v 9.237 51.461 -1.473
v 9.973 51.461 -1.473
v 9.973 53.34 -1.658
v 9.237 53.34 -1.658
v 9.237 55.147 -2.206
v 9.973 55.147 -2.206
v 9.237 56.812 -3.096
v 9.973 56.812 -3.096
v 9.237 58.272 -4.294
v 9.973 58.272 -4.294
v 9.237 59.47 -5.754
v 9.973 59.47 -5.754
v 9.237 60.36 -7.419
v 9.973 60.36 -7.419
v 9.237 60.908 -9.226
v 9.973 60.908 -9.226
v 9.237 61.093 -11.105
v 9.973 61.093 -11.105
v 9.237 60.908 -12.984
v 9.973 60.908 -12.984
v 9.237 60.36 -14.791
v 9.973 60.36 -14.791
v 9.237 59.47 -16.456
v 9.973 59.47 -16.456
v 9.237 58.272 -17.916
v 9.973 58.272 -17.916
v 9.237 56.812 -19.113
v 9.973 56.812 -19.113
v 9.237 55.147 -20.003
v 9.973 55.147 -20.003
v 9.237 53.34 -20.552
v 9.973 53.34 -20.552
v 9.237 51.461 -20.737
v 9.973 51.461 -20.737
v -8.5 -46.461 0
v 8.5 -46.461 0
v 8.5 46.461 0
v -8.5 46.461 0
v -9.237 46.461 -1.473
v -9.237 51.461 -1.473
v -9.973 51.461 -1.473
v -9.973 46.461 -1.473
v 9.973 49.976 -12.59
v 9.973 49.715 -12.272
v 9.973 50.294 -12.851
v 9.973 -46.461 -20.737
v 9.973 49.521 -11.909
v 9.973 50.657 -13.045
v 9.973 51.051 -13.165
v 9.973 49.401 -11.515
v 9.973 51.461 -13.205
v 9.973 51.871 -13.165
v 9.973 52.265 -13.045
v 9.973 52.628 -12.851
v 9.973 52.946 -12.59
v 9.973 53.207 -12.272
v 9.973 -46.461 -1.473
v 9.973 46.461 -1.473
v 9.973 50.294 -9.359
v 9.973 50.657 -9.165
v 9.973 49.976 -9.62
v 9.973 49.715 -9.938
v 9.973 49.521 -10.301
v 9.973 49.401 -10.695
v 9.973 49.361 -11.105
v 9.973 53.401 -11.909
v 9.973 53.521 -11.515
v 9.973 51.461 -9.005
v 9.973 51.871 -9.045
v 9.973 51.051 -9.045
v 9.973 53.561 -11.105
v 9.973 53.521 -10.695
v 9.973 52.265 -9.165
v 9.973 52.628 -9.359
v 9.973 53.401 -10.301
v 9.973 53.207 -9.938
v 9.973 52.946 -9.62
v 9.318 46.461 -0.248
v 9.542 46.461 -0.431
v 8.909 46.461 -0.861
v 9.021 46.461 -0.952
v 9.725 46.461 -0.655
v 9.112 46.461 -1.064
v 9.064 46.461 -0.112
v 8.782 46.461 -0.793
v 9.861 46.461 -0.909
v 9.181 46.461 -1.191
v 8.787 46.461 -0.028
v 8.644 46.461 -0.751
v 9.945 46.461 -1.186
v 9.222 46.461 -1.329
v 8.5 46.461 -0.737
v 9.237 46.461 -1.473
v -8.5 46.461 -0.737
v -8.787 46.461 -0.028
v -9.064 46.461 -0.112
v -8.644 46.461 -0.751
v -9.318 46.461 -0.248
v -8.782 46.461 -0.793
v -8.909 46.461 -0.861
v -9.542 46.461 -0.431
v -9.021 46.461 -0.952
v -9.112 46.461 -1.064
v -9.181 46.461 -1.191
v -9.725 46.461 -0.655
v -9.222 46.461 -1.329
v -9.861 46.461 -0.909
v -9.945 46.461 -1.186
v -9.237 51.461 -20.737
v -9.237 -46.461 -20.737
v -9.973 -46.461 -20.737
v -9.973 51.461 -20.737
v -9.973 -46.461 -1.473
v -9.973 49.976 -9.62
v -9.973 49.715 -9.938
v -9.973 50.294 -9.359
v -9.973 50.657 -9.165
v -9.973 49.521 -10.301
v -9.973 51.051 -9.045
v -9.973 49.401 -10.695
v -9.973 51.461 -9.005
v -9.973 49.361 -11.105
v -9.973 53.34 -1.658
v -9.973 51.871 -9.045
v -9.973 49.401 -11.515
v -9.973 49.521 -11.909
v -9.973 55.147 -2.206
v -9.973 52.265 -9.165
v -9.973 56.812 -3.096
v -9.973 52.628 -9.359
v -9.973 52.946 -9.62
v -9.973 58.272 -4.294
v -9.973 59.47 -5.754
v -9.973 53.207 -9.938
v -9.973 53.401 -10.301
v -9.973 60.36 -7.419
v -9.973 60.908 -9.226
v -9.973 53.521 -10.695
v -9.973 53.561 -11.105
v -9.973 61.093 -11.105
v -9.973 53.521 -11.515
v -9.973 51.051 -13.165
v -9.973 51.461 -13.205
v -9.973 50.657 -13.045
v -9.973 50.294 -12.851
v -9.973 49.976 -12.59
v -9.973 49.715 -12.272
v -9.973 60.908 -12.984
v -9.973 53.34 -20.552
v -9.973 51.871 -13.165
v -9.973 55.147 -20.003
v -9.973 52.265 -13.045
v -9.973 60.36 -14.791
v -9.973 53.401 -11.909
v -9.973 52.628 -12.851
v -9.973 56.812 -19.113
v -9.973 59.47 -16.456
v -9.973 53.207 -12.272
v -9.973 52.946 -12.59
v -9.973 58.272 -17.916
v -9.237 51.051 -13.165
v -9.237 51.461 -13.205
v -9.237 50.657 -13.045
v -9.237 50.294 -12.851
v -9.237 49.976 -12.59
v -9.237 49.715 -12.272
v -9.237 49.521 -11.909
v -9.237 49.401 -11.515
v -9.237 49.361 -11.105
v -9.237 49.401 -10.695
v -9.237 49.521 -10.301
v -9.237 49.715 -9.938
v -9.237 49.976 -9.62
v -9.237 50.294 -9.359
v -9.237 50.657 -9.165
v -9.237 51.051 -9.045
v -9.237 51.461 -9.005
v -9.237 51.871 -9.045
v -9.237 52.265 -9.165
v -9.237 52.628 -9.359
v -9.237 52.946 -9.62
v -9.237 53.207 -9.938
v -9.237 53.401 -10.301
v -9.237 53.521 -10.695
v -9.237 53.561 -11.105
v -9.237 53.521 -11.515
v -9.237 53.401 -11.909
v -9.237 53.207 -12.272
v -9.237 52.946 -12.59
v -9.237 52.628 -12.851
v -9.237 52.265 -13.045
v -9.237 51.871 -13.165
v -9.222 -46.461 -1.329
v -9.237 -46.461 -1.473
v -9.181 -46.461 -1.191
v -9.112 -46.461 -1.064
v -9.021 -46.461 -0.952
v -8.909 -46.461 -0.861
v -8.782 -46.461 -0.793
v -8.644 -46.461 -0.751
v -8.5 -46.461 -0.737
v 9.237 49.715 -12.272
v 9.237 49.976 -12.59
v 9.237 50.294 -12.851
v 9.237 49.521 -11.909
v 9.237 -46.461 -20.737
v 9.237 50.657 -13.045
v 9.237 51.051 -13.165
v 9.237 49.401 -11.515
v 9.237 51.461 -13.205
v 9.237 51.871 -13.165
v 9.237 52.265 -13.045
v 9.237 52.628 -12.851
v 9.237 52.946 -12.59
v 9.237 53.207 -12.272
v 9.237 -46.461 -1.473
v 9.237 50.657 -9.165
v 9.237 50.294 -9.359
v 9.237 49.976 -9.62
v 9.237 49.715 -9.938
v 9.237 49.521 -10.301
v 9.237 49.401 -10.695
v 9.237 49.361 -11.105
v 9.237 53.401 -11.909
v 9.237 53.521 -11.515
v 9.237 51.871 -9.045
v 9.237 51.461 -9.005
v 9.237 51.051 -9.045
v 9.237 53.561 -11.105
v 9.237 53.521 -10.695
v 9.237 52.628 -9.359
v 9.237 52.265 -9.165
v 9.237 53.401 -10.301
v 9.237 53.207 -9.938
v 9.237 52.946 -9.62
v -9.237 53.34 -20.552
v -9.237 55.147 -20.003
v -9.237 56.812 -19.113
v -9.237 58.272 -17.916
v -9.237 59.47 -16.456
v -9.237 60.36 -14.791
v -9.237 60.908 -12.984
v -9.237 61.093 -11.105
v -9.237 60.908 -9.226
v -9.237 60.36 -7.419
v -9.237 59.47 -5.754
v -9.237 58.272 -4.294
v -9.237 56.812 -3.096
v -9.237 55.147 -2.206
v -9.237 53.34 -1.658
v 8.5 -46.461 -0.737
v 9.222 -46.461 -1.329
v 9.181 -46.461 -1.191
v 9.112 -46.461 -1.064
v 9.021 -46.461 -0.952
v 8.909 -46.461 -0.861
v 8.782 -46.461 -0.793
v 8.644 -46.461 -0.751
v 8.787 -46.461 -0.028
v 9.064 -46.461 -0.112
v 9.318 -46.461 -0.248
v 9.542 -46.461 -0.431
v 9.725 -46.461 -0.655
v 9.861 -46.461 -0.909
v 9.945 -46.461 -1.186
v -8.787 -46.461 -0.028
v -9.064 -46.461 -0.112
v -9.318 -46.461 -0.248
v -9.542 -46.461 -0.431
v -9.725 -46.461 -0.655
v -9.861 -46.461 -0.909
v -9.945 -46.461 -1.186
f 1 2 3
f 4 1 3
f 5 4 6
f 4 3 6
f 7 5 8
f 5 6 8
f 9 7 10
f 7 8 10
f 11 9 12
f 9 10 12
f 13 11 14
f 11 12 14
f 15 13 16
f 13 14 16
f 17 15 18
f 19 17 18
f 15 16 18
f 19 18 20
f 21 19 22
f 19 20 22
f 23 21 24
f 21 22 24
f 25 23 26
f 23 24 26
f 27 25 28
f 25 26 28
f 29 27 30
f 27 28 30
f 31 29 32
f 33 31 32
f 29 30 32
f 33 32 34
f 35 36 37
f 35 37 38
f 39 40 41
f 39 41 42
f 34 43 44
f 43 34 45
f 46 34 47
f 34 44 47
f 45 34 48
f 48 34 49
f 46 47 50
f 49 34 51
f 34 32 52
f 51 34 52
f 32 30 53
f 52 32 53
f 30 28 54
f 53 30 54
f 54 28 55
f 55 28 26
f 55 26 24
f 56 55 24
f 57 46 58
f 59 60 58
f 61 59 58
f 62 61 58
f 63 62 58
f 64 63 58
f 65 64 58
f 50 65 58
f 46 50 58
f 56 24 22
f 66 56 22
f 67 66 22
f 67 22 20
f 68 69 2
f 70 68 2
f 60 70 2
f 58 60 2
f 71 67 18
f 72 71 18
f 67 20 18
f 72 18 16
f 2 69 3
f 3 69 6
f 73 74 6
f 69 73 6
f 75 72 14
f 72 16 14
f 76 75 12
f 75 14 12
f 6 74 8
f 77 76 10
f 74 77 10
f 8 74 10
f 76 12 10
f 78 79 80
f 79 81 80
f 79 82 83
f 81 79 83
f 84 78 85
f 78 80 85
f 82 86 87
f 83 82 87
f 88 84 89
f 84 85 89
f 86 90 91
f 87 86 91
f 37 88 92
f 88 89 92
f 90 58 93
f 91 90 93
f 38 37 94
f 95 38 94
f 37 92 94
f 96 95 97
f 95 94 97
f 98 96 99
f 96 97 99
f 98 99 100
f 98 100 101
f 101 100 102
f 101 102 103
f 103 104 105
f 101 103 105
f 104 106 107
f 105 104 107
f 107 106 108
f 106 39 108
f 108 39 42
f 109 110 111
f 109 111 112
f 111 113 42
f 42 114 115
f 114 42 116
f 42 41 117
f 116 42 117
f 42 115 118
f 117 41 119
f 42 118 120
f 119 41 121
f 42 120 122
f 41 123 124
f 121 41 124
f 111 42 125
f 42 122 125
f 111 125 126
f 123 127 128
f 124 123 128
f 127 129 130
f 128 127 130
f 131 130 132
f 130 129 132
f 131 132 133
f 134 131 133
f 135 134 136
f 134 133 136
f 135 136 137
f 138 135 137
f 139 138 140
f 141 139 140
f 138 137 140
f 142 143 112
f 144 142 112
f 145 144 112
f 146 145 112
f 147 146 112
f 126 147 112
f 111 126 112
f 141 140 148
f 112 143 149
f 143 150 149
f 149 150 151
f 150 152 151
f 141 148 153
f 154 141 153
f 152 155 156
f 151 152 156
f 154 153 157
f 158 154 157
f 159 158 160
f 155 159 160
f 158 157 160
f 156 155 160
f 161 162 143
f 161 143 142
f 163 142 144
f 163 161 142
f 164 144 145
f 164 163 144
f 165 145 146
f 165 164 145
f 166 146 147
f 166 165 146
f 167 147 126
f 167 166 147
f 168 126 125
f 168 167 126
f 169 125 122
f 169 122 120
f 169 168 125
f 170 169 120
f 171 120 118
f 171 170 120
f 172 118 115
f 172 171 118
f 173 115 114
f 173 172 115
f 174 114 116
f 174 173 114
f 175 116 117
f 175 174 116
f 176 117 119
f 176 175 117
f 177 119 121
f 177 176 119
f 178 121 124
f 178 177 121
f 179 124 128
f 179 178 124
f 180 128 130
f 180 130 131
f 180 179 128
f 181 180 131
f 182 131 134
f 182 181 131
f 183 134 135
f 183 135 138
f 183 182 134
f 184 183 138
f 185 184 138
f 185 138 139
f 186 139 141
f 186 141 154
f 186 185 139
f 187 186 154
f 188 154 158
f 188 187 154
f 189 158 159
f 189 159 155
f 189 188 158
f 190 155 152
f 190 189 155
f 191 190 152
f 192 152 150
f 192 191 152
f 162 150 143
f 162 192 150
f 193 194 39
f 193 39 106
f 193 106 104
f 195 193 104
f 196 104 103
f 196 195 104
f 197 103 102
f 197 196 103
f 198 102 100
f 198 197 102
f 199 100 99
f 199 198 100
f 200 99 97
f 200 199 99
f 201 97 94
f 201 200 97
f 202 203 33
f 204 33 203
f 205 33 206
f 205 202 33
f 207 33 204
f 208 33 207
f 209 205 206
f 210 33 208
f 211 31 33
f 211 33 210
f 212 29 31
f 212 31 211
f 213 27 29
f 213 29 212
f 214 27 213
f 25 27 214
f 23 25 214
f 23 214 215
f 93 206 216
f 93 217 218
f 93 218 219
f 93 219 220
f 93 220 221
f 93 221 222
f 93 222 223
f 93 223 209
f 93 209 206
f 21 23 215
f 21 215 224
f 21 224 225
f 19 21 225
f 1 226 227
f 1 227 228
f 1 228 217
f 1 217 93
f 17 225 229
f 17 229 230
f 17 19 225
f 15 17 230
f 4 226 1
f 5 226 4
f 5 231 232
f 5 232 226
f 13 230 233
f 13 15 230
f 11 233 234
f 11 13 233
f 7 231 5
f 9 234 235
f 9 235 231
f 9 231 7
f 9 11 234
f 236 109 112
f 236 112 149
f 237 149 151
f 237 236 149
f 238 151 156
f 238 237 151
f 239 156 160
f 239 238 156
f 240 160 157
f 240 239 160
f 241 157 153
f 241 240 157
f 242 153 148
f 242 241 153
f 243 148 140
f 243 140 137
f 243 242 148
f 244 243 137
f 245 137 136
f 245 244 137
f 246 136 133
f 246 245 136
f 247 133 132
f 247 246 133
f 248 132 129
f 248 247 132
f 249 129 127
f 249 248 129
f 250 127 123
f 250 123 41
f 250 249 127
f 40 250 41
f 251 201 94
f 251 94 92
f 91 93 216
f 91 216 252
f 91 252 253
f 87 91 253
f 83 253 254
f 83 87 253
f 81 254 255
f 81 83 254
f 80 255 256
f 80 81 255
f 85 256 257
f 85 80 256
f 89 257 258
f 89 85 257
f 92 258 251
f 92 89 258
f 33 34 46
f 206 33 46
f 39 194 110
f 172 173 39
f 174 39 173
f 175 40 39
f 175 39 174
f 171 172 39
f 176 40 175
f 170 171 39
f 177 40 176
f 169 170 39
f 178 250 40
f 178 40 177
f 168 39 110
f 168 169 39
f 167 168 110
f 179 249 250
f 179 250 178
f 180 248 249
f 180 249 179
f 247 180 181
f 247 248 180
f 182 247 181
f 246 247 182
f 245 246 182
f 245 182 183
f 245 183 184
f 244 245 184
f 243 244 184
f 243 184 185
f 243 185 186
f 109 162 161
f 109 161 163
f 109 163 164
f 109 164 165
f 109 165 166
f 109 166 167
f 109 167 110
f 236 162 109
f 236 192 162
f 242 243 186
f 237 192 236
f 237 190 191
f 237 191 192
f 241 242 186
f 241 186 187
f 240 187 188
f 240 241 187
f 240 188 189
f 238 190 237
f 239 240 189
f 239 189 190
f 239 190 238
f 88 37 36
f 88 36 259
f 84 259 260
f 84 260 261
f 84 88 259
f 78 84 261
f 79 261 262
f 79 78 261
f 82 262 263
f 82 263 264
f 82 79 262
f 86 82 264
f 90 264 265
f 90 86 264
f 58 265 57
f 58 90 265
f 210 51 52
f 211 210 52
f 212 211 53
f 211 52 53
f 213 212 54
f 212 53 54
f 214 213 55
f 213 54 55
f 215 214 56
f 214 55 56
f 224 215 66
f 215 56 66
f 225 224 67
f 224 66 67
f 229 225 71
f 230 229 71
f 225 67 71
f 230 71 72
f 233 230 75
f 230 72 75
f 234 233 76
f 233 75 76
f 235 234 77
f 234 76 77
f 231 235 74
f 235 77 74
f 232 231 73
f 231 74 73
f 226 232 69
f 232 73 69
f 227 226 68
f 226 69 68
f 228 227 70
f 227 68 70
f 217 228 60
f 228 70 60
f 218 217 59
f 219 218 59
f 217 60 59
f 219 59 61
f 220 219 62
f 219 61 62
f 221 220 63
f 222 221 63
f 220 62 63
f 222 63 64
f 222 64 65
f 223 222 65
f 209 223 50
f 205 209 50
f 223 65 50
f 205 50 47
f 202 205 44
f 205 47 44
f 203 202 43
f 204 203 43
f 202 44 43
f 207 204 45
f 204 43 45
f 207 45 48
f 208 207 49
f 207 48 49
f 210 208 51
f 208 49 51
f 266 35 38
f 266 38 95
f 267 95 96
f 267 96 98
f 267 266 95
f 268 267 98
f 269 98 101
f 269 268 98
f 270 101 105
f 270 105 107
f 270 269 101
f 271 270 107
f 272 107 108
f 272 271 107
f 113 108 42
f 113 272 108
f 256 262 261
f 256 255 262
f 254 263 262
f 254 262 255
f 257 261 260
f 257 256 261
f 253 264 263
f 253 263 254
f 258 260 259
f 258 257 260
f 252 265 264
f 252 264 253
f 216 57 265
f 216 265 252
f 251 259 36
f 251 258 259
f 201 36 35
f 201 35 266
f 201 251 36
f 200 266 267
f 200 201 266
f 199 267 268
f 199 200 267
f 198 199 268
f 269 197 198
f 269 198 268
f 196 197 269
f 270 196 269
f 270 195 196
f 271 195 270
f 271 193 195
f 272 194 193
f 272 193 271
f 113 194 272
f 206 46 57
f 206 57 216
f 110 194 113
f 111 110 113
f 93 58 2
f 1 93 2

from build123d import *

# Parameters (mm, degrees)
SKETCH1_W               = 15
SKETCH1_H               = 92.922077922
BASE_FLANGE1_DEPTH      = 0.7366
EDGE_FLANGE2_DEPTH      = 92.922077922
EDGE_FLANGE2_BEND_DEPTH = 92.922077922
SKETCH31_R              = 2.1
TAB3_DEPTH              = 0.7366
TAB4_START              = -0.7366
SKETCH35_R              = 2.1
TAB4_DEPTH              = 0.7366


# Sheet-metal steps are written as plain solids
with BuildPart() as part:
    # Sketch1 → Base-Flange1 (new body)
    with BuildSketch(Plane.XY):
        Rectangle(SKETCH1_W, SKETCH1_H)
    extrude(amount=-BASE_FLANGE1_DEPTH)

    # Edge-Flange2 section (across the edge) → Edge-Flange2 (add)
    with BuildSketch(Plane(origin=(9.2366, 46.461038961, -0.7366), x_dir=(-1, 0, 0), z_dir=(0, -1, 0))):
        with BuildLine():
            Line((-0.7366, 0.7366), (-0.7366, 20))
            Line((-0.7366, 20), (0, 20))
            Line((0, 20), (0, 0.7366))
            ThreePointArc((0, 0.7366), (0.215745145, 0.215745145), (0.7366, 0))
            Line((0.7366, 0), (1.7366, 0))
            Line((1.7366, 0), (1.7366, -0.7366))
            Line((1.7366, -0.7366), (0.7366, -0.7366))
            ThreePointArc((0.7366, -0.7366), (-0.30510971, -0.30510971), (-0.7366, 0.7366))
        make_face()
    extrude(amount=EDGE_FLANGE2_DEPTH)

    # Edge-Flange2 section 2 (across the edge) → Edge-Flange2 bend (add)
    with BuildSketch(Plane(origin=(-9.2366, -46.461038961, -0.7366), x_dir=(1, 0, 0), z_dir=(0, 1, 0))):
        with BuildLine():
            Line((-0.7366, 0.7366), (-0.7366, 20))
            Line((-0.7366, 20), (0, 20))
            Line((0, 20), (0, 0.7366))
            ThreePointArc((0, 0.7366), (0.215745145, 0.215745145), (0.7366, 0))
            Line((0.7366, 0), (1.7366, 0))
            Line((1.7366, 0), (1.7366, -0.7366))
            Line((1.7366, -0.7366), (0.7366, -0.7366))
            ThreePointArc((0.7366, -0.7366), (-0.30510971, -0.30510971), (-0.7366, 0.7366))
        make_face()
    extrude(amount=EDGE_FLANGE2_BEND_DEPTH)

    # Sketch31 → Tab3 (add)
    with BuildSketch(Plane(origin=(9.9732, 0, 0), x_dir=(0, 0, -1), z_dir=(1, 0, 0))):
        with BuildLine():
            Line((1.4732, 46.461038961), (1.4732, 51.461038961))
            ThreePointArc((1.4732, 51.461038961), (11.1049, 61.092738961), (20.7366, 51.461038961))
            Line((20.7366, 51.461038961), (20.7366, 46.461038961))
            Line((20.7366, 46.461038961), (1.4732, 46.461038961))
        make_face()
        with Locations((11.1049, 51.461038961)):
            Circle(SKETCH31_R, mode=Mode.SUBTRACT)
    extrude(amount=-TAB3_DEPTH)

    # Sketch35 → Tab4 (add)
    with BuildSketch(Plane.ZY.offset(9.9732).offset(TAB4_START)):
        with BuildLine():
            Line((-20.7366, 46.461038961), (-20.7366, 51.461038961))
            ThreePointArc((-20.7366, 51.461038961), (-11.1049, 61.092738961), (-1.4732, 51.461038961))
            Line((-1.4732, 51.461038961), (-1.4732, 46.461038961))
            Line((-1.4732, 46.461038961), (-20.7366, 46.461038961))
        make_face()
        with Locations(Location((-11.1049, 51.461038961, 0), (0, 0, 180))):
            Circle(SKETCH35_R, mode=Mode.SUBTRACT)
    extrude(amount=TAB4_DEPTH)


solid = part.part
